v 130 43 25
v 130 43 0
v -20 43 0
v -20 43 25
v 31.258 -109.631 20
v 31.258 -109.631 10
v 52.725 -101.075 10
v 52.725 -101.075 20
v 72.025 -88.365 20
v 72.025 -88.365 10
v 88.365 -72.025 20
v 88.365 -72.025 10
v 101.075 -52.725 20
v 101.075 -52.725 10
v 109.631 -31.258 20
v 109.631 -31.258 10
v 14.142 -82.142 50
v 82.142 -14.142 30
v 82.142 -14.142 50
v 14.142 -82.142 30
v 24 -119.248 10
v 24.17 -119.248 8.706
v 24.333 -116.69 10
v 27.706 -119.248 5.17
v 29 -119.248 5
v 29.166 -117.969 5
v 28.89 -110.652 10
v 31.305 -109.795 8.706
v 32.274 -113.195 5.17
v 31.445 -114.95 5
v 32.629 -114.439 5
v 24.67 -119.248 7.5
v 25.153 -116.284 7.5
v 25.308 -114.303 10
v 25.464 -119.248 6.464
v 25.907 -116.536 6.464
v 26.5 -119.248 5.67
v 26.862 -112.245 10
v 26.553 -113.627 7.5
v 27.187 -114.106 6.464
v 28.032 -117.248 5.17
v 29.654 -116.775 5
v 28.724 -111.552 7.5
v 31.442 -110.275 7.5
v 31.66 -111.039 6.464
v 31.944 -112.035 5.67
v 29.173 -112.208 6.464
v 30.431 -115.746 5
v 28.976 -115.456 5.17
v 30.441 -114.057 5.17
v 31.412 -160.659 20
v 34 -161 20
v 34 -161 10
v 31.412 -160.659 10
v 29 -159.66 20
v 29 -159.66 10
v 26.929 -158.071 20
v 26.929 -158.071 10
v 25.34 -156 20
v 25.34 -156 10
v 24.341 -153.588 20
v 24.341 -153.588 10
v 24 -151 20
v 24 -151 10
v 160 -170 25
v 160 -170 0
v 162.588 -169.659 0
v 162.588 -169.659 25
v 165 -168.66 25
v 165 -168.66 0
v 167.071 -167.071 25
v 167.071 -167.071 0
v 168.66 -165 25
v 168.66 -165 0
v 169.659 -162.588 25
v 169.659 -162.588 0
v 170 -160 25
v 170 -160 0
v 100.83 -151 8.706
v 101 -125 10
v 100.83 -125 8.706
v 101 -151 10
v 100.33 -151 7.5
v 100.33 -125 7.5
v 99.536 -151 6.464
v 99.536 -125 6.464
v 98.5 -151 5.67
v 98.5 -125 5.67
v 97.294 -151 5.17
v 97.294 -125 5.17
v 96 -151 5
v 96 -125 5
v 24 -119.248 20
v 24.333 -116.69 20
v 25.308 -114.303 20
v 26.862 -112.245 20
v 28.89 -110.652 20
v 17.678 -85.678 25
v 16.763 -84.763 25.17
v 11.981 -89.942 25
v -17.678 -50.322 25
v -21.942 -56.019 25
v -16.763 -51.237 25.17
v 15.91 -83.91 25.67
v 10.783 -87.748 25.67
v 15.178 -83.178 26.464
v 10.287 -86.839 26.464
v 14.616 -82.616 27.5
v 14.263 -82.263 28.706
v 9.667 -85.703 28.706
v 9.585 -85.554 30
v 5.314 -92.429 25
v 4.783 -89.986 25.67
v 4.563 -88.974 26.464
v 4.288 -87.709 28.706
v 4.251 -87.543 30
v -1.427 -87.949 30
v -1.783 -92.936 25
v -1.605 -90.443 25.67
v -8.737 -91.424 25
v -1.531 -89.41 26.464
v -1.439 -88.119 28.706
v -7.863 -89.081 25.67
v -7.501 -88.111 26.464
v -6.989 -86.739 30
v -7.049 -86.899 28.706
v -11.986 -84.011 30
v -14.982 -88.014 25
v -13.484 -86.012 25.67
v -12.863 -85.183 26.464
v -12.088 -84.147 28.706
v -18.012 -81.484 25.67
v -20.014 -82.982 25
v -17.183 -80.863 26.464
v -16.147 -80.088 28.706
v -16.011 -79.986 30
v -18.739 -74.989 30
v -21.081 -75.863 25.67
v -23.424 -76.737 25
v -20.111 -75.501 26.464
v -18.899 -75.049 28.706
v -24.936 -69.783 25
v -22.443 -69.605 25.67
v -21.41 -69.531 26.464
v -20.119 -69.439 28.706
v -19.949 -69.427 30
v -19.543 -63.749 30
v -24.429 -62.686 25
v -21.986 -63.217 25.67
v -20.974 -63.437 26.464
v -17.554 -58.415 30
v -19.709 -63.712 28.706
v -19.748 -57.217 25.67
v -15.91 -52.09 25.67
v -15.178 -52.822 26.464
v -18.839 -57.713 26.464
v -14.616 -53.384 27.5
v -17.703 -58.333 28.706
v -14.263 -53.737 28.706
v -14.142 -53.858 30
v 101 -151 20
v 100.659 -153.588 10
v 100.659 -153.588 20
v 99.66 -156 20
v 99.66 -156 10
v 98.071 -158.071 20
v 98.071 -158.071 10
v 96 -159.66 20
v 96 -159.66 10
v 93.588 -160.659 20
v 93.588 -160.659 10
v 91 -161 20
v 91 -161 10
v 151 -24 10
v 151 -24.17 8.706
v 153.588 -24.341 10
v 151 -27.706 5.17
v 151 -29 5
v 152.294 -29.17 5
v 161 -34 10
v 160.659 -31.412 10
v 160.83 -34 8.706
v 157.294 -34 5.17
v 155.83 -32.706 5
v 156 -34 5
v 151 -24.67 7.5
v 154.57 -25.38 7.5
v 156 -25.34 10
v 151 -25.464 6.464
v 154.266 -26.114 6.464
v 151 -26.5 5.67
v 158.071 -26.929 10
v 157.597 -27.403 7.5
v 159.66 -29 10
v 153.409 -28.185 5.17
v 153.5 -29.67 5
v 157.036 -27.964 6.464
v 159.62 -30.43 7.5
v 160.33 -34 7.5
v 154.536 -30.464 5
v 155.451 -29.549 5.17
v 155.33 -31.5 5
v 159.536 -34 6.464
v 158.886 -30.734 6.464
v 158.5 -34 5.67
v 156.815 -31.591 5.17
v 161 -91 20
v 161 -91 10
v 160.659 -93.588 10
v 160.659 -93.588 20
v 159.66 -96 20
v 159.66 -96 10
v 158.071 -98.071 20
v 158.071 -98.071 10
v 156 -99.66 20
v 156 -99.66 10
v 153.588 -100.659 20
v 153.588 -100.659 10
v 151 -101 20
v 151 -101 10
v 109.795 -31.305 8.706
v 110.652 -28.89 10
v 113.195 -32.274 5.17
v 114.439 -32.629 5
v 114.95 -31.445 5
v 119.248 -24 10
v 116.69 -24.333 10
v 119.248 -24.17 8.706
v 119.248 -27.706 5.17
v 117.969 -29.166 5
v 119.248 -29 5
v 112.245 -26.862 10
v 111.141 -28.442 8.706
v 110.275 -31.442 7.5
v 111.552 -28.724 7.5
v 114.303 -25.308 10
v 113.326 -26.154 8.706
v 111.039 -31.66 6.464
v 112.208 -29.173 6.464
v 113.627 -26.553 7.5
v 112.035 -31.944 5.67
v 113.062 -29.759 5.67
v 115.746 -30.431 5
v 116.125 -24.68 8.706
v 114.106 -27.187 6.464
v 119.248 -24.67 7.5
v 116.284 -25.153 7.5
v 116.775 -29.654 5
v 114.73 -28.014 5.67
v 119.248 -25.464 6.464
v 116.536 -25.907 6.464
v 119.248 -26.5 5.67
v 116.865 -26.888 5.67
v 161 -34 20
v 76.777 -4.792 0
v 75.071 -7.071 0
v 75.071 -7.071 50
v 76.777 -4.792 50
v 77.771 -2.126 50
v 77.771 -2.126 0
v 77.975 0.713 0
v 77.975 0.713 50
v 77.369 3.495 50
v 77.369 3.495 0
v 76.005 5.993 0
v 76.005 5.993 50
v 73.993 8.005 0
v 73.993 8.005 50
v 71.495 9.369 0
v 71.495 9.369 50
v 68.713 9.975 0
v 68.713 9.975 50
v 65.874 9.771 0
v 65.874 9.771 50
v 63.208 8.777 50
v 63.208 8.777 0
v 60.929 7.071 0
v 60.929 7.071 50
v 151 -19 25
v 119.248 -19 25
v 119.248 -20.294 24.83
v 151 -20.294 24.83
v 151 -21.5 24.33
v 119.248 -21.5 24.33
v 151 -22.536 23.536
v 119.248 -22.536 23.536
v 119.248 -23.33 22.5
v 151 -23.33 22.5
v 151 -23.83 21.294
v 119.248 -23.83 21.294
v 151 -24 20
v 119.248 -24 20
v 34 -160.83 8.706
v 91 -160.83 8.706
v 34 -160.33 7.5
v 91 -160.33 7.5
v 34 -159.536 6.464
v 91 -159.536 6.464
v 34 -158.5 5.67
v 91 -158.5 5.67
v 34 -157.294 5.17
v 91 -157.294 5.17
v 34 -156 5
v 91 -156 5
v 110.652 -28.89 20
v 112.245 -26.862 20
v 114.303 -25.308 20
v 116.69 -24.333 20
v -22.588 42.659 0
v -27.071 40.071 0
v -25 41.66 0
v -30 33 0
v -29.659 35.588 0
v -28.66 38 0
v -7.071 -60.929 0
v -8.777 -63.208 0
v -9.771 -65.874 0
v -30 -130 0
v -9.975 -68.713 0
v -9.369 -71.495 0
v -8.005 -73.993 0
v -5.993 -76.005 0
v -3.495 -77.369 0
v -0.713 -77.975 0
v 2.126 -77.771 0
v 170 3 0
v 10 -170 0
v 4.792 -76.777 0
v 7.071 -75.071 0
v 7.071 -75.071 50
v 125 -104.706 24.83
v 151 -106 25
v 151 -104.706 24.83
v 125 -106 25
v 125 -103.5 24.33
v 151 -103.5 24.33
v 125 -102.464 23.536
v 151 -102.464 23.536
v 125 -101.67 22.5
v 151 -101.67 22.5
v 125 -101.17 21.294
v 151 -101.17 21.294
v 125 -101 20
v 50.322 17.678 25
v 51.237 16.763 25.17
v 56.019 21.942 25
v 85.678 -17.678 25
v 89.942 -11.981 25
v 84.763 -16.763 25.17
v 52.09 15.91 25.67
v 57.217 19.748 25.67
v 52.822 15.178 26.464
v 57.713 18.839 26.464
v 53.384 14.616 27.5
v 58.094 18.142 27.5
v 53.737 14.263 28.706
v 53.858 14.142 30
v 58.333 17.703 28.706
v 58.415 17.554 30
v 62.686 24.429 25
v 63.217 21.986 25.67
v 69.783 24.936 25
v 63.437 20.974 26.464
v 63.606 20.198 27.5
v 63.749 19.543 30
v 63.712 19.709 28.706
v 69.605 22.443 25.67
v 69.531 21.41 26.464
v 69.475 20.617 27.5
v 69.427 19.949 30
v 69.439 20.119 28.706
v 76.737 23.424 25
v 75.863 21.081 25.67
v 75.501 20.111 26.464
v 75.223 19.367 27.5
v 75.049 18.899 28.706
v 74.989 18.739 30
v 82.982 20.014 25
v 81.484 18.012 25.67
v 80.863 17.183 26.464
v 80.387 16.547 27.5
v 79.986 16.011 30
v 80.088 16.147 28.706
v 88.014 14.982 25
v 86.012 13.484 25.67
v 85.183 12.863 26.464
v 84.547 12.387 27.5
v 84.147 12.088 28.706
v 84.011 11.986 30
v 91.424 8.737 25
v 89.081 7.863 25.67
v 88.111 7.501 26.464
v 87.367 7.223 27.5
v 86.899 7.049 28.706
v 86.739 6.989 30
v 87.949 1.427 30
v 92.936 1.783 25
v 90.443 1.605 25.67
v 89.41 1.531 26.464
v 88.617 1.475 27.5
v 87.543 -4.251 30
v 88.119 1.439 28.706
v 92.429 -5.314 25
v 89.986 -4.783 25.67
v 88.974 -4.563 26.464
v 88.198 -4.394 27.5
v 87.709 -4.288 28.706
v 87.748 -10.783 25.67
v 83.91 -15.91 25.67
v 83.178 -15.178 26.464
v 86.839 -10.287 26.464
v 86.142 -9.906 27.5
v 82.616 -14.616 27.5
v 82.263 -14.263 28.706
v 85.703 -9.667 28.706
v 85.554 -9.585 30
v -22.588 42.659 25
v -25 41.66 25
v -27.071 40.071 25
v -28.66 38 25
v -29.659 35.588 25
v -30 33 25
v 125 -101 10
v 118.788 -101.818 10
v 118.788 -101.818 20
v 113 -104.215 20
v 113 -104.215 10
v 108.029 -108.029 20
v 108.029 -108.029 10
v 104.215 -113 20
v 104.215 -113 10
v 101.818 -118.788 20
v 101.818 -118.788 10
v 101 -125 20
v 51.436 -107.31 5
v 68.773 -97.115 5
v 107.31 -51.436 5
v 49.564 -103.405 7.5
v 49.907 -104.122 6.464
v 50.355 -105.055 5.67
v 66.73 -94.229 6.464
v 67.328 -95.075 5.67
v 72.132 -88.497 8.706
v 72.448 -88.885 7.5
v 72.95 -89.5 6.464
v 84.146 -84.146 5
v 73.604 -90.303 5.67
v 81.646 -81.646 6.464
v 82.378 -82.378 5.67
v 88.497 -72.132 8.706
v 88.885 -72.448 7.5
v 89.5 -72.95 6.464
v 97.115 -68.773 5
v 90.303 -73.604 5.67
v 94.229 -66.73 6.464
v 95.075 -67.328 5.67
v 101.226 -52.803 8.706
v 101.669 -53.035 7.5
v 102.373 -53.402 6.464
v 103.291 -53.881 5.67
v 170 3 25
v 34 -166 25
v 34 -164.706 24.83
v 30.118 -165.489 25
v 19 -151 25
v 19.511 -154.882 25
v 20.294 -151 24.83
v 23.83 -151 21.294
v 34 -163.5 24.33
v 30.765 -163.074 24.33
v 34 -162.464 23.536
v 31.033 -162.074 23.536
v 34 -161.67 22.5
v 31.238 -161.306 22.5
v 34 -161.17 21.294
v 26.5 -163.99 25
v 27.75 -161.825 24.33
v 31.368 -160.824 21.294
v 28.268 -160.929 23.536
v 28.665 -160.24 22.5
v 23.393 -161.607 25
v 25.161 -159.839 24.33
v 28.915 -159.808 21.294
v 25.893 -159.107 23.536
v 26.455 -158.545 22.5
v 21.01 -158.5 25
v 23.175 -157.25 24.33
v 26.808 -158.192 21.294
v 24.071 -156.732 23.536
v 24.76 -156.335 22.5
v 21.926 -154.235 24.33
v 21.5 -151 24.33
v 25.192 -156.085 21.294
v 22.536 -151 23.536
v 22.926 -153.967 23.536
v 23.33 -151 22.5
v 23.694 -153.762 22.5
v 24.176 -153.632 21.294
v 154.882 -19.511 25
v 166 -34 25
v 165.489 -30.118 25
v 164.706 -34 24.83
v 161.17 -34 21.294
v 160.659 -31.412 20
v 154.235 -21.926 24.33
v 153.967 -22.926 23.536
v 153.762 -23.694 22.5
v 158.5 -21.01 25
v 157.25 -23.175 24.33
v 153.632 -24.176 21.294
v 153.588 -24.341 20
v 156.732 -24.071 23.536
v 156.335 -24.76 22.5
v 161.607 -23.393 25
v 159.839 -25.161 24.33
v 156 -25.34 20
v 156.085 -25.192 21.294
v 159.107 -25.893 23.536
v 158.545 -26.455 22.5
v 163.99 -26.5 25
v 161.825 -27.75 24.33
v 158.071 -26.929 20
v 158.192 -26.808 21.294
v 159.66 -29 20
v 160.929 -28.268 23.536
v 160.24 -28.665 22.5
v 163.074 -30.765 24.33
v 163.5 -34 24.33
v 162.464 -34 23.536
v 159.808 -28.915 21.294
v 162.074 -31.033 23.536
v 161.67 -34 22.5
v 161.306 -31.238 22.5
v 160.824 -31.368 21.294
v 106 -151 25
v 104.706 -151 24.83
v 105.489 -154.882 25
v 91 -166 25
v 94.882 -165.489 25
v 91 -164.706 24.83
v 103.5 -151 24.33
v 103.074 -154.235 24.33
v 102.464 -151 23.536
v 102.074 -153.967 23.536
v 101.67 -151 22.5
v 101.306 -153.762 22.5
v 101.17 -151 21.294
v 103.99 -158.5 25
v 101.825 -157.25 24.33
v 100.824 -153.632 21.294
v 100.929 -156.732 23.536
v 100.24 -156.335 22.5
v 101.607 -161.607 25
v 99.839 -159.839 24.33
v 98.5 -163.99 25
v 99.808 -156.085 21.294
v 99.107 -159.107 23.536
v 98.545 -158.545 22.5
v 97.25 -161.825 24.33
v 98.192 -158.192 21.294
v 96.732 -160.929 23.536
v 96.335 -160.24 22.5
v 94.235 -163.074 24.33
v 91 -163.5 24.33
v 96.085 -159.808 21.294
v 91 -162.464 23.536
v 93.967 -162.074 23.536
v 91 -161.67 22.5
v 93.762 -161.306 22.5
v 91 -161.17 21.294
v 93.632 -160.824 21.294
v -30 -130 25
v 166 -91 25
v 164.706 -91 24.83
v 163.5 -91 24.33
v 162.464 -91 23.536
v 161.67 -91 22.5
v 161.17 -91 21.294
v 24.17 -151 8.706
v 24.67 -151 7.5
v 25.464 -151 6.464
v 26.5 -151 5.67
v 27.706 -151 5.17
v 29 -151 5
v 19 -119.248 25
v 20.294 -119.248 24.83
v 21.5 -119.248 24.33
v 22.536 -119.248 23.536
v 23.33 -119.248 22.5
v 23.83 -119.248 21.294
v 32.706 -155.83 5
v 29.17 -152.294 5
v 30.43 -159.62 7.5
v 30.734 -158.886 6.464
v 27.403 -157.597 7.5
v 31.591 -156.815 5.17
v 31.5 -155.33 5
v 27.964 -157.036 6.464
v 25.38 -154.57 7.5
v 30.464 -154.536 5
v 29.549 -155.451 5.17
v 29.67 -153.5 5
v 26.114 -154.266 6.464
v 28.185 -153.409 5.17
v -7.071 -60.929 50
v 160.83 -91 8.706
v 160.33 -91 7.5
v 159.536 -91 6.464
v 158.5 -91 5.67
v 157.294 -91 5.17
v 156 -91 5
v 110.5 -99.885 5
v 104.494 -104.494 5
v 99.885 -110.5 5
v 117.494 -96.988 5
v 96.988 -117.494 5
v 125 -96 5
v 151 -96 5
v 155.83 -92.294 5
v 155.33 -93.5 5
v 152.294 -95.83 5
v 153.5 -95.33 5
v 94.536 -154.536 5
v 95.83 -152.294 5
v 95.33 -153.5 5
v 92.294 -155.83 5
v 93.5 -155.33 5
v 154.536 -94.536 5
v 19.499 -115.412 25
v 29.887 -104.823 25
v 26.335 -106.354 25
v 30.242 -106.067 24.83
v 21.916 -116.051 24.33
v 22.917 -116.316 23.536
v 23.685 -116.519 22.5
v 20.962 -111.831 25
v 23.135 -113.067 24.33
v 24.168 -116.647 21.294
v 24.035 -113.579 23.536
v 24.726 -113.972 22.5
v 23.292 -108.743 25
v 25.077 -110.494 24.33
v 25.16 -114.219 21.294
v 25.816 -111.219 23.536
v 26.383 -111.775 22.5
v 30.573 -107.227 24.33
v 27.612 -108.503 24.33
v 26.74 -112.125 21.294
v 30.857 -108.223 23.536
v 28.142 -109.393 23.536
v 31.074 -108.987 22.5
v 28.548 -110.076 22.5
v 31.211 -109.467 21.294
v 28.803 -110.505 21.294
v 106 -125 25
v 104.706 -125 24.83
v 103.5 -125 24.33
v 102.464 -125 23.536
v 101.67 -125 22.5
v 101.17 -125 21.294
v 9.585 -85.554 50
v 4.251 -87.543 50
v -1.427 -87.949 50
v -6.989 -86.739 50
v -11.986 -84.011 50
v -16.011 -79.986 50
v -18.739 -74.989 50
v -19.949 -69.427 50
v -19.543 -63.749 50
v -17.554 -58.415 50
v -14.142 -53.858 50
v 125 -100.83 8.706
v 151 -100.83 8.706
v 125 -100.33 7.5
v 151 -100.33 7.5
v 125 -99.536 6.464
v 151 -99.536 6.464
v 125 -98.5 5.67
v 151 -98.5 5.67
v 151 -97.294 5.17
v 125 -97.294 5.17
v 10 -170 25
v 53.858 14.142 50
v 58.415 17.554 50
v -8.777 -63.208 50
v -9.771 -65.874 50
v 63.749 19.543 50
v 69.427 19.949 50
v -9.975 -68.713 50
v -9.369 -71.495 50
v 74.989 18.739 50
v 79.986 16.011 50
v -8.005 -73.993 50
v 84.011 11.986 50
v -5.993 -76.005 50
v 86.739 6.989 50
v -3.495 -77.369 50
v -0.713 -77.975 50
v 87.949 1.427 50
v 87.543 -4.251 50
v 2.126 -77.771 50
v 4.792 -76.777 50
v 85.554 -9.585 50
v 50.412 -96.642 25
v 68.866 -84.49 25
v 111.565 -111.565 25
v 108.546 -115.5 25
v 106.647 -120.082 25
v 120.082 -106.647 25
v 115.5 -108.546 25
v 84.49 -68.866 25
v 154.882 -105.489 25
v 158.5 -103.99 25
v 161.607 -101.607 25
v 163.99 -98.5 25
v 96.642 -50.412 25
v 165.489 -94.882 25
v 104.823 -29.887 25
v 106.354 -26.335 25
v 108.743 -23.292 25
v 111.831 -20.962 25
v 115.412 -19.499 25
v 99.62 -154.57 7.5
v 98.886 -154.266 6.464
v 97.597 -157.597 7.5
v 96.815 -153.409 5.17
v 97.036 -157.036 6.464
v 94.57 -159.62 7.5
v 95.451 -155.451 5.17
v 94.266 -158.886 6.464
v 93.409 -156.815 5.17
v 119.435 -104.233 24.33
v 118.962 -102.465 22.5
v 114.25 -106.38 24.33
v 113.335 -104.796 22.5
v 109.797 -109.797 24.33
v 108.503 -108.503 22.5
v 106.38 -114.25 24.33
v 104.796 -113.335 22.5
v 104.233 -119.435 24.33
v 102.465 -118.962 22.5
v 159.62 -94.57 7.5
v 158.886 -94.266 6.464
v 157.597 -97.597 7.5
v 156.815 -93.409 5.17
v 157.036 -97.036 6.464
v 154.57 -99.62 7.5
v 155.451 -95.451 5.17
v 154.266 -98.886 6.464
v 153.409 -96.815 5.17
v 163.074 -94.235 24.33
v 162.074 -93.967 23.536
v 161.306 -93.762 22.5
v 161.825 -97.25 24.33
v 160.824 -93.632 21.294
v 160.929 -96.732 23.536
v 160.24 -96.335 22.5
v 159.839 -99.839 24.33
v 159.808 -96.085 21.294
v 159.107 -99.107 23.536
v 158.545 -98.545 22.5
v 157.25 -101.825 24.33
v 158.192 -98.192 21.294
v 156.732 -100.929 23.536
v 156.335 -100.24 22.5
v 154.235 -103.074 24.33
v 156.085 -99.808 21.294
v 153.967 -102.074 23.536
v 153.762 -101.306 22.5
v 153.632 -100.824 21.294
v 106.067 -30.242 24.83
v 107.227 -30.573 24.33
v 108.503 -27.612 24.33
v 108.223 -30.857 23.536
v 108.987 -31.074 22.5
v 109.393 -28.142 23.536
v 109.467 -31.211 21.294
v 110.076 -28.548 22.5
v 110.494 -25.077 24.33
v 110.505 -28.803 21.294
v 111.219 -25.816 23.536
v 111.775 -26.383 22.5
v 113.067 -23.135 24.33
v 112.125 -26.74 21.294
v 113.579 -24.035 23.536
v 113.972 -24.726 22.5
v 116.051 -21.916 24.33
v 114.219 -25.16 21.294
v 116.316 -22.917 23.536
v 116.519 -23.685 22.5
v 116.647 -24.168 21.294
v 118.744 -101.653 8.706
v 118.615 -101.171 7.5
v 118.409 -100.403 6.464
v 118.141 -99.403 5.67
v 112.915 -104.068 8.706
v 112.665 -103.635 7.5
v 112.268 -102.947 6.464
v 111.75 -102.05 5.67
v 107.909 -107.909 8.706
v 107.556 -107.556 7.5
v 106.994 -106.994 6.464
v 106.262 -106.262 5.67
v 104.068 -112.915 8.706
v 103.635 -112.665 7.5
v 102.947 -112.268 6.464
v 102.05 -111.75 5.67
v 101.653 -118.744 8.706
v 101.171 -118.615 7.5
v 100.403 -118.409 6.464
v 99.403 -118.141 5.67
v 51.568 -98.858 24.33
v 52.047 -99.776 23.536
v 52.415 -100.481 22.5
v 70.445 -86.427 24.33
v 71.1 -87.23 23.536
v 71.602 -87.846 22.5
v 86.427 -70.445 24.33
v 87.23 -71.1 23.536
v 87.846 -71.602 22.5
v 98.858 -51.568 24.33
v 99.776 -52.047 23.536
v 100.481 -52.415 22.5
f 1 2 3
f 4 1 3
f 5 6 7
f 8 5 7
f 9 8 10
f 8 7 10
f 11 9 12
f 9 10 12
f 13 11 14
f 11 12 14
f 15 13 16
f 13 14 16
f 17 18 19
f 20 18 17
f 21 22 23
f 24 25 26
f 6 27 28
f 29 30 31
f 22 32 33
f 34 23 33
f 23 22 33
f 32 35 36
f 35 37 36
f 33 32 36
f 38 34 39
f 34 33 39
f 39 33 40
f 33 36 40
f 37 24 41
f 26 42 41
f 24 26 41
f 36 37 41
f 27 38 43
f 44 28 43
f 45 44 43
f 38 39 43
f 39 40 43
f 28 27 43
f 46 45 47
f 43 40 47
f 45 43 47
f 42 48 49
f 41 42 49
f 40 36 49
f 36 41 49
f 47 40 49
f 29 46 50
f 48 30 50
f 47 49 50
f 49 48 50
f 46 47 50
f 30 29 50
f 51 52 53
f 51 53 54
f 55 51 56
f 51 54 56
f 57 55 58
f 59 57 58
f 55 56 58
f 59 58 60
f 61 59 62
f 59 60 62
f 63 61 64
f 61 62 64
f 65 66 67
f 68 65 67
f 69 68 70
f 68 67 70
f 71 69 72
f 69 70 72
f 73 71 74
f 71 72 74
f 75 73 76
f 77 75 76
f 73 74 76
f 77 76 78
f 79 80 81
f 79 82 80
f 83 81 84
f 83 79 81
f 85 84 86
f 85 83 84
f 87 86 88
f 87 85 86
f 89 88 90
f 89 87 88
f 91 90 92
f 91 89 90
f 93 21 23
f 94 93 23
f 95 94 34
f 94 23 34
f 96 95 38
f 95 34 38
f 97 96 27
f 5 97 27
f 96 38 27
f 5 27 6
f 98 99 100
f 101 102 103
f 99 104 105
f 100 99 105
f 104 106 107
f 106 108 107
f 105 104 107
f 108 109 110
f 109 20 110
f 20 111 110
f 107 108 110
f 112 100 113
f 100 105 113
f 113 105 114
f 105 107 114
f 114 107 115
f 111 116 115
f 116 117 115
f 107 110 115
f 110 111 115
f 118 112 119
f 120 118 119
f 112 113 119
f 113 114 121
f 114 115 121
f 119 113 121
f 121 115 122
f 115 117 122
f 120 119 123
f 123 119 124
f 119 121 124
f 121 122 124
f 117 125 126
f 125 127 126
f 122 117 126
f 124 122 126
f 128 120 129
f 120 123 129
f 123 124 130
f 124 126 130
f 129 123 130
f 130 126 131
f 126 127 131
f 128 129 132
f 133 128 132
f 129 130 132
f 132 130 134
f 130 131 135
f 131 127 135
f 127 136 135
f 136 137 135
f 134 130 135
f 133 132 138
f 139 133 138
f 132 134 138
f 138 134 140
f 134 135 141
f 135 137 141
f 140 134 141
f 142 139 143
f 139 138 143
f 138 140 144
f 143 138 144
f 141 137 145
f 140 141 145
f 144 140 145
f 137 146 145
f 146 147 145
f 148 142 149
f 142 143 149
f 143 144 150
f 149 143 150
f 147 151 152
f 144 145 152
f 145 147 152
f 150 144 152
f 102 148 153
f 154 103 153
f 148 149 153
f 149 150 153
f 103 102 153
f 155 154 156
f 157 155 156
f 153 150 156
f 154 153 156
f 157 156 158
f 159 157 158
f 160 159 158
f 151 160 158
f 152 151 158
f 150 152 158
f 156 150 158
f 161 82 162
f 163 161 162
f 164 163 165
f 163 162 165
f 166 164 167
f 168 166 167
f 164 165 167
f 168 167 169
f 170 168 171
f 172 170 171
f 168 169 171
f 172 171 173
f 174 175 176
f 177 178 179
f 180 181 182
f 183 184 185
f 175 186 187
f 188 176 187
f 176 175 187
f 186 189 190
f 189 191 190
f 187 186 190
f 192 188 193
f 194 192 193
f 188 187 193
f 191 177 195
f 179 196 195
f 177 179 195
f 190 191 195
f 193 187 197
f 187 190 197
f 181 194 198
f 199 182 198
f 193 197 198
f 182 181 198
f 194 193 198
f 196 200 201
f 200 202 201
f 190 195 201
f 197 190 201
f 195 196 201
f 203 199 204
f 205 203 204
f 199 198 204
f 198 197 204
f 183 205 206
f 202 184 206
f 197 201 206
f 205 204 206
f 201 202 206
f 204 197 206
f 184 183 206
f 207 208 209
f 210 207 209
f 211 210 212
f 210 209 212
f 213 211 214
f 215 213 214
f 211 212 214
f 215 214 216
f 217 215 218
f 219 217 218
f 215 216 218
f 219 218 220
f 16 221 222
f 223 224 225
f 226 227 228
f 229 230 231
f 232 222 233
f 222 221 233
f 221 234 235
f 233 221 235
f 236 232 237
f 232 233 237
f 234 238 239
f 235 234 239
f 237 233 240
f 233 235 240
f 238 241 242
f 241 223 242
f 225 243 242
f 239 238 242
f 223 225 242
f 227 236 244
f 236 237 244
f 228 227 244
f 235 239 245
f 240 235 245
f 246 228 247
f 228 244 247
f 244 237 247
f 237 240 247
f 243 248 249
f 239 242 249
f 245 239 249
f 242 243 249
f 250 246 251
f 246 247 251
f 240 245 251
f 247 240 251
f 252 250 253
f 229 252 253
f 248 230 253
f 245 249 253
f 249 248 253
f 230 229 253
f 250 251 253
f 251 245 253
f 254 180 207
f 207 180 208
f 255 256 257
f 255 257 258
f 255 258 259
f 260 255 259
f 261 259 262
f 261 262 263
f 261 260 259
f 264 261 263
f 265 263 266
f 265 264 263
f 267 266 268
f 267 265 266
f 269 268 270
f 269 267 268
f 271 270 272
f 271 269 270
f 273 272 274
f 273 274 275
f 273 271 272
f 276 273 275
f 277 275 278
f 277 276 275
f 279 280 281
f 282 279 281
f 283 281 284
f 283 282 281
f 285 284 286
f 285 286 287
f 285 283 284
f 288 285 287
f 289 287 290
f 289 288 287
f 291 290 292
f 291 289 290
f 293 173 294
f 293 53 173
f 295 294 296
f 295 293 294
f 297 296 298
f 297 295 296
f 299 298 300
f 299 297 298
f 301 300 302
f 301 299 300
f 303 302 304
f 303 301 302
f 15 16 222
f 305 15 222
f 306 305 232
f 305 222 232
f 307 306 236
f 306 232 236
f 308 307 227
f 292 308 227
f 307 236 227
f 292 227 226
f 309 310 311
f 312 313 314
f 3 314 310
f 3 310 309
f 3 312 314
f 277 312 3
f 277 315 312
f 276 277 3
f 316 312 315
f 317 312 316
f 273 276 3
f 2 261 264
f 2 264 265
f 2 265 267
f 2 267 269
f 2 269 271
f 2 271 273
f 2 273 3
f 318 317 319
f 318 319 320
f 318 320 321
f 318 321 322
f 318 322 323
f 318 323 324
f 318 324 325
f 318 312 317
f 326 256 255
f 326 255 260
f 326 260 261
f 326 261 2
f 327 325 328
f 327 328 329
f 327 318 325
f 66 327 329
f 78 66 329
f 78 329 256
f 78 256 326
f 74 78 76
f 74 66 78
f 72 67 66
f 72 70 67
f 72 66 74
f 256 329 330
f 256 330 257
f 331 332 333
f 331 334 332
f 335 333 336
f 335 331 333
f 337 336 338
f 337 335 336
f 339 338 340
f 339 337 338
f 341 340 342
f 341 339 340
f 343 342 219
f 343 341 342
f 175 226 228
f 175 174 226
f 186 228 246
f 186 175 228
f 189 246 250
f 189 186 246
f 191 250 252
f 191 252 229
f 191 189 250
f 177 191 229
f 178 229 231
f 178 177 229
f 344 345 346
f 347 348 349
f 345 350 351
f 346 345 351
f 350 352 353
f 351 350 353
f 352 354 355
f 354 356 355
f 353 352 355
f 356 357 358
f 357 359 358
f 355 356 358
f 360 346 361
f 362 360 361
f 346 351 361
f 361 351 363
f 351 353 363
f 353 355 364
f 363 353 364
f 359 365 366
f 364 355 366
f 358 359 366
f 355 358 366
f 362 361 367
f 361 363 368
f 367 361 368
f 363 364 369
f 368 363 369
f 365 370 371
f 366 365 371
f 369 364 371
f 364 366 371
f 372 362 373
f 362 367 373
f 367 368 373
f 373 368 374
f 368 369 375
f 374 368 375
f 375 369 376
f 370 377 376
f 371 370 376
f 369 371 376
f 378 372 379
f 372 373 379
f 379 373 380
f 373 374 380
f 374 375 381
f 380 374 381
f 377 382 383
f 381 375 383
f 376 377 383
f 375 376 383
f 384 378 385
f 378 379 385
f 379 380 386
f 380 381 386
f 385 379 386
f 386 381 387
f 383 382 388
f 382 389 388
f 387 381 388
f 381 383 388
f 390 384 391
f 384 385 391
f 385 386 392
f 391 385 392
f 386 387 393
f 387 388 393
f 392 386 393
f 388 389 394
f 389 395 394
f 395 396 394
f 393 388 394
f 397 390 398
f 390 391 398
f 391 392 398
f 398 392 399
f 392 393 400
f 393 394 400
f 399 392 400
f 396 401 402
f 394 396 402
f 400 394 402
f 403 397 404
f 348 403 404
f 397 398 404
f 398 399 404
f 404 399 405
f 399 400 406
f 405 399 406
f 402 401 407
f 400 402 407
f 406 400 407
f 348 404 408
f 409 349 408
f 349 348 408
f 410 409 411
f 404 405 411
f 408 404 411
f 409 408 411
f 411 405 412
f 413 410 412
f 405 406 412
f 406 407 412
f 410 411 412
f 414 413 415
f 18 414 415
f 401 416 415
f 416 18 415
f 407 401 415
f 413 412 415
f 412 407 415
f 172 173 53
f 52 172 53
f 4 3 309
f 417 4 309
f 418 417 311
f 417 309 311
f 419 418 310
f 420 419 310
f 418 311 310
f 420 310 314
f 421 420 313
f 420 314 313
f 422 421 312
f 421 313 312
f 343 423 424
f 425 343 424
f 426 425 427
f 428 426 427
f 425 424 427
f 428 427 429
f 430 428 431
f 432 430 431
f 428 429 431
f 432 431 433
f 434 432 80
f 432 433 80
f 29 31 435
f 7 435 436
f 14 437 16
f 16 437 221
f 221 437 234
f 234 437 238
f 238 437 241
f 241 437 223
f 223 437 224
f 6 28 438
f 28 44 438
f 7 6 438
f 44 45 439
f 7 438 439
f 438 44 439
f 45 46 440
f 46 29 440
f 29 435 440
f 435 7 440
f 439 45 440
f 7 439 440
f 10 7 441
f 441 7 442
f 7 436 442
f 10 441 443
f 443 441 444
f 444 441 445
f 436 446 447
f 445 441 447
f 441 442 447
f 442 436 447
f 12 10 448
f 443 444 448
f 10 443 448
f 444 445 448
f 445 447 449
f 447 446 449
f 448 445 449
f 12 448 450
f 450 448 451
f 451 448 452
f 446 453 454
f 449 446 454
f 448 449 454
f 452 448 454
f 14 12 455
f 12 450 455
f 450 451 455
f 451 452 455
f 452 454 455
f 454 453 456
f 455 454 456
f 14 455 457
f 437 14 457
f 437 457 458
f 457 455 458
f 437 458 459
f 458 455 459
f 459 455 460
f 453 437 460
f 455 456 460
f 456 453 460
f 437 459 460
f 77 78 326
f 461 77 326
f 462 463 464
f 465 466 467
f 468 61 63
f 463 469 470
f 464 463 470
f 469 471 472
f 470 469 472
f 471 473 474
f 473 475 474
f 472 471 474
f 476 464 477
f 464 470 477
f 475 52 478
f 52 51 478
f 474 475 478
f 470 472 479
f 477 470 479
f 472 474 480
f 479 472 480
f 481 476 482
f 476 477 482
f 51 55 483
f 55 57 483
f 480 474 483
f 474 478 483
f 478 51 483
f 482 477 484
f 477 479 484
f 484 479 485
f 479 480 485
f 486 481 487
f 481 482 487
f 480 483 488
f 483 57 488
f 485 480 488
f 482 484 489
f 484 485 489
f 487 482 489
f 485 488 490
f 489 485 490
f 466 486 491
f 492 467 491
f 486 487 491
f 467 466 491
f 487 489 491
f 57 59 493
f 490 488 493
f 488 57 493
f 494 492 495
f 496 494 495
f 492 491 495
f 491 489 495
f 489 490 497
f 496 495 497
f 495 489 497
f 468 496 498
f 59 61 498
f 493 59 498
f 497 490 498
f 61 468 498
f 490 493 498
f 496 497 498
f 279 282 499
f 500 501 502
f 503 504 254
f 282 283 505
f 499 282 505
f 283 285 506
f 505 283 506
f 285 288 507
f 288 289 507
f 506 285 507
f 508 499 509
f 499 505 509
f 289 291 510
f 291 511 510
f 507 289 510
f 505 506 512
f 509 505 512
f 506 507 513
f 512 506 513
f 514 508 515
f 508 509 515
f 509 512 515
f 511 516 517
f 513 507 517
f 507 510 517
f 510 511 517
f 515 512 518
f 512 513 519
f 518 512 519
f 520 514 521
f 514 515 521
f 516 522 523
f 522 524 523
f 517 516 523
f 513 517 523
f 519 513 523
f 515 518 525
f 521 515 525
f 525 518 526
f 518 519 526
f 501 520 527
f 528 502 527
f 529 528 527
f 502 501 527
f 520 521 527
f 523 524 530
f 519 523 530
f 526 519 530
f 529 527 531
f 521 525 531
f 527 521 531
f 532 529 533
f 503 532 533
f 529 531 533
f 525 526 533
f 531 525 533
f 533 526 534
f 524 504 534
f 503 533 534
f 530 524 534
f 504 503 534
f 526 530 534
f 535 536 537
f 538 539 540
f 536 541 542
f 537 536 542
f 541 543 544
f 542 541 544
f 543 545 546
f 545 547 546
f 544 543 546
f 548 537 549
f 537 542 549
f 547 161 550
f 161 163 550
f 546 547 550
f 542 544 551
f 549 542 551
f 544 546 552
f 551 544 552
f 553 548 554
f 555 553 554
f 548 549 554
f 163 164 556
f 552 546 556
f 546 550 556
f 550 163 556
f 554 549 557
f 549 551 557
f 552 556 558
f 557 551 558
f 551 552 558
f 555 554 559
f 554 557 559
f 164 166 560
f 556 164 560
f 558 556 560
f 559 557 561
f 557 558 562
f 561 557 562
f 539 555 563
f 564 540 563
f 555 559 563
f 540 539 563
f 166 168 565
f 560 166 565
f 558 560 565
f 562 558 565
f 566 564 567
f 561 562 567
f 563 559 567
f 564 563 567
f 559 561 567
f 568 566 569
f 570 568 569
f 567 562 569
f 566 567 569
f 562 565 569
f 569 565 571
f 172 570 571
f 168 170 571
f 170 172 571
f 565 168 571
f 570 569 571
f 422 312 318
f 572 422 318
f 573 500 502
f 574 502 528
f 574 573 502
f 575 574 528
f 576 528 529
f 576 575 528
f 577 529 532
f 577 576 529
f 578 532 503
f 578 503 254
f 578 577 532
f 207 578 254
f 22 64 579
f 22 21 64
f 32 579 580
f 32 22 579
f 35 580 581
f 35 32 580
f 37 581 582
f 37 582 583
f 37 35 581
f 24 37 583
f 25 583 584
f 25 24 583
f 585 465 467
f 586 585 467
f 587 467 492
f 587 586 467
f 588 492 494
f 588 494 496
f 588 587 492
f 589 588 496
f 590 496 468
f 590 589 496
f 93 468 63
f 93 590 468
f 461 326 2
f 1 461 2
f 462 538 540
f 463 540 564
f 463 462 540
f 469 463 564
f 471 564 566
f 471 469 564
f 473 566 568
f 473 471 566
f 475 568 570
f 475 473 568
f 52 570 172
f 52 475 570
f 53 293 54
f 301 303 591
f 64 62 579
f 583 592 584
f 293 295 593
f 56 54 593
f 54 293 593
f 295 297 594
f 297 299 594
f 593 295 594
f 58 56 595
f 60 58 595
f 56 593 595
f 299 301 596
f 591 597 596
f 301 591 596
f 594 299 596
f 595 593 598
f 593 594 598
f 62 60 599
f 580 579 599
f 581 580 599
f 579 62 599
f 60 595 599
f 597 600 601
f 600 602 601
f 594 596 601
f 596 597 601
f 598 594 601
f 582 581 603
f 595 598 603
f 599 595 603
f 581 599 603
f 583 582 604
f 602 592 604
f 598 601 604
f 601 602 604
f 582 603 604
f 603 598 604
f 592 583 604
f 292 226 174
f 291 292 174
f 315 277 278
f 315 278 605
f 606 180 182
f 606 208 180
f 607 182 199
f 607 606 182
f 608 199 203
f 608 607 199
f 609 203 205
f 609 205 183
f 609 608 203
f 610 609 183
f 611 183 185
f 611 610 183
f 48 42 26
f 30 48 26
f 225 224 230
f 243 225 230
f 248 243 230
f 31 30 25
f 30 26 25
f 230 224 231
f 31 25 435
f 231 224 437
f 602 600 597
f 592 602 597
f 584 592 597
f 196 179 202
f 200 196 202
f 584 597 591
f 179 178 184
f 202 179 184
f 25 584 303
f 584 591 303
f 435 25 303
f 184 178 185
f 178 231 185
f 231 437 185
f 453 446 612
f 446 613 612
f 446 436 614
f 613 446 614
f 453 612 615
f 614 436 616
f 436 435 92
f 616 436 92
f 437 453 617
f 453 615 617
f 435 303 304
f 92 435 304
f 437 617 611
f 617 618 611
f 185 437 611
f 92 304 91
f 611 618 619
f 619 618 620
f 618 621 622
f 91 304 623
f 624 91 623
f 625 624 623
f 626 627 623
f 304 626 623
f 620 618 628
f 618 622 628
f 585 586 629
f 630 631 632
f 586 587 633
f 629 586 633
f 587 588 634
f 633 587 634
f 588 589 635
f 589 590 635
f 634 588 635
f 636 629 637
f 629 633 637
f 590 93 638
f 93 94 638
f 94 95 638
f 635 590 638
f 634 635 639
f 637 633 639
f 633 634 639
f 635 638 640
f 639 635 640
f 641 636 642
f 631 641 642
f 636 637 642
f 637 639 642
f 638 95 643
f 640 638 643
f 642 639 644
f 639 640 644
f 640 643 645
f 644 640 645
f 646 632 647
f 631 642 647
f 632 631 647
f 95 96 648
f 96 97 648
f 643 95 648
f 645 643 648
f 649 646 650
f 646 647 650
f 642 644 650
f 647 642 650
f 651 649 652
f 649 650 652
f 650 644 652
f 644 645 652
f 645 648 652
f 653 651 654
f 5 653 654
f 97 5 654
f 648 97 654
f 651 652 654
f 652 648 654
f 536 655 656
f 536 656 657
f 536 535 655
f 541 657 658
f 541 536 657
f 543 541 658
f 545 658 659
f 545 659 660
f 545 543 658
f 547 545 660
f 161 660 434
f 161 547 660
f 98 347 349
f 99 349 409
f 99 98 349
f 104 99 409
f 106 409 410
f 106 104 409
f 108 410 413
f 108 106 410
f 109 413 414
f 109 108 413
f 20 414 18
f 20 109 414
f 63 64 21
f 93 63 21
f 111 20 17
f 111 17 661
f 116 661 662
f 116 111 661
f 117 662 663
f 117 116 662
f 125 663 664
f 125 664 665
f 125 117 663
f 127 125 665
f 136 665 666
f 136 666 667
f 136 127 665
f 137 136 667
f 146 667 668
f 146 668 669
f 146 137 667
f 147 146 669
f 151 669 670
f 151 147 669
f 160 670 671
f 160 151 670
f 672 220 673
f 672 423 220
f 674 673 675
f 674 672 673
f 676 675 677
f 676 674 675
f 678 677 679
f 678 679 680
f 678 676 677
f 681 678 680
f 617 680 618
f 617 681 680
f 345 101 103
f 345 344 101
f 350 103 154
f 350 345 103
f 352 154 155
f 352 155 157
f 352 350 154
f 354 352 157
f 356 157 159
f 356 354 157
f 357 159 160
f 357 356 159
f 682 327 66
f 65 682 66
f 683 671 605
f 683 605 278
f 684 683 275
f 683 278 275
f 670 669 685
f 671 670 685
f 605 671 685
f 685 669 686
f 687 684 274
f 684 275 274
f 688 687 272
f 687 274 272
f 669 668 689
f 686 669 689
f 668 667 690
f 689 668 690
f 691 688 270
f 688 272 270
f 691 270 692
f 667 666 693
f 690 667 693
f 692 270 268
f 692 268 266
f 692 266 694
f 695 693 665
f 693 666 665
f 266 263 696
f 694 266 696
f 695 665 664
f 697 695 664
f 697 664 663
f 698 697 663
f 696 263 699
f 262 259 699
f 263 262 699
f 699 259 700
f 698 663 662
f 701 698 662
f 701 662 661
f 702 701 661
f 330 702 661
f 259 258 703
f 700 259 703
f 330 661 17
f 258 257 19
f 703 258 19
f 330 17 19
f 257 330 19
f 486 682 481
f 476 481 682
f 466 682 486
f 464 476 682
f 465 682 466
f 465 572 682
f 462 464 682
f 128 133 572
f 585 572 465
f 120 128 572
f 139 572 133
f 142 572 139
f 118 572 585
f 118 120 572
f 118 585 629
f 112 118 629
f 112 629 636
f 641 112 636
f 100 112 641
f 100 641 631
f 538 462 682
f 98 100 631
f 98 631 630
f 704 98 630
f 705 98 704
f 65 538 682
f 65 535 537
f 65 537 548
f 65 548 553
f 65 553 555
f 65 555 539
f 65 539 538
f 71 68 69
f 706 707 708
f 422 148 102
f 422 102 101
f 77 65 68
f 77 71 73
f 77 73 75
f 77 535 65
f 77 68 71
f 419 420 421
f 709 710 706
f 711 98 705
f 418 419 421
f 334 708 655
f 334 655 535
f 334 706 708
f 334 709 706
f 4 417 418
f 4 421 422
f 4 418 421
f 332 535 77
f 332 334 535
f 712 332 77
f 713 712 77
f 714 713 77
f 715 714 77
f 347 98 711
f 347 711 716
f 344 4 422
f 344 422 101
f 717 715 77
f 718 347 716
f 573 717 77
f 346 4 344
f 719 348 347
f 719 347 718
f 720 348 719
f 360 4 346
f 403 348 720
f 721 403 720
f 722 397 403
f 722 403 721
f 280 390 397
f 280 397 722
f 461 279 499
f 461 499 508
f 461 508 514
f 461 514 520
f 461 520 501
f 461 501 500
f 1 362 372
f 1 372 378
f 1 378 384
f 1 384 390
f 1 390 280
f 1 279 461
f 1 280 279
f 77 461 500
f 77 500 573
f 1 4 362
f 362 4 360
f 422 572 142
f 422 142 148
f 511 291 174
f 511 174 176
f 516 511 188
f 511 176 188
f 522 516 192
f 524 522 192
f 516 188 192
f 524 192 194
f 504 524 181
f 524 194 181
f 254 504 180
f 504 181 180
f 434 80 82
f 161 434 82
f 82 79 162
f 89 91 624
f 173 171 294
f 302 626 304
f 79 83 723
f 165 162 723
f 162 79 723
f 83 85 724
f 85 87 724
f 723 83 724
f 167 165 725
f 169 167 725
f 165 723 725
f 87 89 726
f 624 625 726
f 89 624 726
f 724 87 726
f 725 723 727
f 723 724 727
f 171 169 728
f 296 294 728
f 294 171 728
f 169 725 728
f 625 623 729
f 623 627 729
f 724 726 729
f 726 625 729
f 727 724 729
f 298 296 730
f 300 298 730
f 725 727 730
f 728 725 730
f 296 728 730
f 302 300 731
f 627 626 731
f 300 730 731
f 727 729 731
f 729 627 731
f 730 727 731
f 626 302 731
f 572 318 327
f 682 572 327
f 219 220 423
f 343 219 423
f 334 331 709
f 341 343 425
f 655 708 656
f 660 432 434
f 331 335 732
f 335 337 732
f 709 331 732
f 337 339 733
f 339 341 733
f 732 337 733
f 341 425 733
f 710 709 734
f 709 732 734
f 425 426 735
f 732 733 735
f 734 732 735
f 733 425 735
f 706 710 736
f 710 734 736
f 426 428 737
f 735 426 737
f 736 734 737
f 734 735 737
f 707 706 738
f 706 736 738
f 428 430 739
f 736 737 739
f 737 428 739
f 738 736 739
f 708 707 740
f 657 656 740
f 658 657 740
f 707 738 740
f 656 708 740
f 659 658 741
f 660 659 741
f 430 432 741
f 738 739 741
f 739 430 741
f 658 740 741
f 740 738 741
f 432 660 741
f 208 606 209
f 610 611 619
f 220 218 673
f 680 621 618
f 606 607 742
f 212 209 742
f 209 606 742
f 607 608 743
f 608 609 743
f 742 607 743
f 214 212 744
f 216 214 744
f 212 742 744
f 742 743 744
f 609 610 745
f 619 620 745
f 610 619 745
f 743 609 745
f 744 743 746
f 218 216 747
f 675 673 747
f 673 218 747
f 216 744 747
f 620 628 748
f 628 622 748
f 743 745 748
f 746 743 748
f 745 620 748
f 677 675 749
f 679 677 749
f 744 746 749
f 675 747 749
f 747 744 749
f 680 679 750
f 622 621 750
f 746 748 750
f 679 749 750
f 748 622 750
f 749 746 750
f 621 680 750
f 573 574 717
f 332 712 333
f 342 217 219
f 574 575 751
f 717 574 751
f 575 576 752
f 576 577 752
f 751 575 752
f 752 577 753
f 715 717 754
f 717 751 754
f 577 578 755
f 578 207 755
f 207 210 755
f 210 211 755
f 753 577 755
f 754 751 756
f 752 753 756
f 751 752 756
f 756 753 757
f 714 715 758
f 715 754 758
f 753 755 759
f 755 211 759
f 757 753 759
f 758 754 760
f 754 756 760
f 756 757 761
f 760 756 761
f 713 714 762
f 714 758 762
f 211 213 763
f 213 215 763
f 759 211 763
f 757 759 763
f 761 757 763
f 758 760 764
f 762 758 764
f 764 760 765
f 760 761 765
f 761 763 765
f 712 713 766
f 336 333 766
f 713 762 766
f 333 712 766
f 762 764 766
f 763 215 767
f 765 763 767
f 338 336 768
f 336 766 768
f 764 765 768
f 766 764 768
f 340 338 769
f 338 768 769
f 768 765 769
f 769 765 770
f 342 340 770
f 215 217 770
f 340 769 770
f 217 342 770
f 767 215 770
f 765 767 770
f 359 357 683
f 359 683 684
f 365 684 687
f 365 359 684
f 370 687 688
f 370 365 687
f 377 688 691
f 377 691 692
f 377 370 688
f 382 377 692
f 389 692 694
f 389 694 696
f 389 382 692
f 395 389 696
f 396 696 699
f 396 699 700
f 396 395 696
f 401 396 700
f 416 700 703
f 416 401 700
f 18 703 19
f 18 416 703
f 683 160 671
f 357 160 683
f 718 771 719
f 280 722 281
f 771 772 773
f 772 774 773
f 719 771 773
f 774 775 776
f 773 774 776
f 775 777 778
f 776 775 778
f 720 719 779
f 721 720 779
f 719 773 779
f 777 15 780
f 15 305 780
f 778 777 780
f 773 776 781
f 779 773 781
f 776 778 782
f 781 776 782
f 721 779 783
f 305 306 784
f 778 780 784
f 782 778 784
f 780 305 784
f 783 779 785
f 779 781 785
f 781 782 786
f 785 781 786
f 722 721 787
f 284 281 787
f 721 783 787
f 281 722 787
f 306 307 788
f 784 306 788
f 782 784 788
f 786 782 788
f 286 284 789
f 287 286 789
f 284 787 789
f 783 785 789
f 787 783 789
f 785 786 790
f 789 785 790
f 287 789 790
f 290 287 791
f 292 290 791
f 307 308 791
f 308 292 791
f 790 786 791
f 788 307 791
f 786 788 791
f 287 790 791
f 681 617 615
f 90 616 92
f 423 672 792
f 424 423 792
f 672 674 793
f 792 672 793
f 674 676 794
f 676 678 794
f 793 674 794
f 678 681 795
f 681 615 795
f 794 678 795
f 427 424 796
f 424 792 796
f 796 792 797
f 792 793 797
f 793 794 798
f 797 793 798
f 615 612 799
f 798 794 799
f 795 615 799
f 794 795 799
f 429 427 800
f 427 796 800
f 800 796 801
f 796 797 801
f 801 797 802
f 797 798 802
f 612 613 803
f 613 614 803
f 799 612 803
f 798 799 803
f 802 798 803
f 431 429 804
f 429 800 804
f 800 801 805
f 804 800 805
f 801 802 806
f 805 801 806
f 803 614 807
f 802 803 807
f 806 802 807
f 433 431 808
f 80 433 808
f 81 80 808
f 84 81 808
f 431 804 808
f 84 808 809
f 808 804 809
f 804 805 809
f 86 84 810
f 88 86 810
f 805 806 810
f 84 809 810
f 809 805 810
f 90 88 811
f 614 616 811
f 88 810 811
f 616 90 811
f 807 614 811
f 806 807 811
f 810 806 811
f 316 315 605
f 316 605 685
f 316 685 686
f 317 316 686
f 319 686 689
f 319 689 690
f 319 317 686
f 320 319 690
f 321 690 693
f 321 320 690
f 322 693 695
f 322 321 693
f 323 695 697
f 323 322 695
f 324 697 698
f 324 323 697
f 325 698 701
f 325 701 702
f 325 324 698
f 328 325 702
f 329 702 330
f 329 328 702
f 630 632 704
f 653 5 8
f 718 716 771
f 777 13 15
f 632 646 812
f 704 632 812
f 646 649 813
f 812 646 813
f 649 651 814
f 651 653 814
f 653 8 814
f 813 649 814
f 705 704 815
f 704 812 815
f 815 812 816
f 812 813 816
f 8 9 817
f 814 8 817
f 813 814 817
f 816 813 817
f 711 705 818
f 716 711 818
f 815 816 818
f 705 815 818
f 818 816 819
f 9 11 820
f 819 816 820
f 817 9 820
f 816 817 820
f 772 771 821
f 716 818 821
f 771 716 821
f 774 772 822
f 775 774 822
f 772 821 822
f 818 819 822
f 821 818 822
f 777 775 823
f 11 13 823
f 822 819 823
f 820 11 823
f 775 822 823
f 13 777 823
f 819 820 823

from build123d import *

# Parameters (mm, degrees)
F1_DEPTH = 25
F3_DEPTH = 5
F4_DEPTH = 50
F5_R     = 5


with BuildPart() as f1:
    # F0 (on Top) → F1 (new body)
    with BuildSketch(Plane.XY):
        with BuildLine():
            Line((170, -160), (170, 3))
            Line((170, 3), (130, 43))
            Line((130, 43), (-20, 43))
            ThreePointArc((-20, 43), (-27.0710678119, 40.0710678119), (-30, 33))
            Line((-30, 33), (-30, -130))
            Line((-30, -130), (10, -170))
            Line((10, -170), (160, -170))
            ThreePointArc((160, -170), (167.0710678119, -167.0710678119), (170, -160))
        make_face()
        with BuildLine():
            ThreePointArc((24, -119.2476414861), (26.018165786, -113.2234965193), (31.2580645161, -109.630896205))
            ThreePointArc((31.2580645161, -109.630896205), (80.6101730553, -80.6101730553), (109.630896205, -31.2580645161))
            ThreePointArc((109.630896205, -31.2580645161), (113.2234965193, -26.018165786), (119.2476414861, -24))
            Line((119.2476414861, -24), (151, -24))
            ThreePointArc((151, -24), (158.0710678119, -26.9289321881), (161, -34))
            Line((161, -34), (161, -91))
            ThreePointArc((161, -91), (158.0710678119, -98.0710678119), (151, -101))
            Line((151, -101), (125, -101))
            ThreePointArc((125, -101), (108.0294372515, -108.0294372515), (101, -125))
            Line((101, -125), (101, -151))
            ThreePointArc((101, -151), (98.0710678119, -158.0710678119), (91, -161))
            Line((91, -161), (34, -161))
            ThreePointArc((34, -161), (26.9289321881, -158.0710678119), (24, -151))
            Line((24, -151), (24, -119.2476414861))
        make_face(mode=Mode.SUBTRACT)
        with BuildLine():
            ThreePointArc((53.8578643763, 14.1421356237), (82.1421356237, 14.1421356237), (82.1421356237, -14.1421356237))
            Line((82.1421356237, -14.1421356237), (14.1421356237, -82.1421356237))
            ThreePointArc((14.1421356237, -82.1421356237), (-14.1421356237, -82.1421356237), (-14.1421356237, -53.8578643763))
            Line((-14.1421356237, -53.8578643763), (53.8578643763, 14.1421356237))
        make_face(mode=Mode.SUBTRACT)
    extrude(amount=F1_DEPTH)

    # F2 (on face) → F3 (join)
    with BuildSketch(Plane(origin=(0, 0, 0), x_dir=(1, 0, 0), z_dir=(0, 0, -1))):
        with BuildLine():
            ThreePointArc((34, 161), (26.9289321881, 158.0710678119), (24, 151))
            Line((24, 151), (24, 119.2476414861))
            ThreePointArc((24, 119.2476414861), (26.018165786, 113.2234965193), (31.2580645161, 109.630896205))
            ThreePointArc((31.2580645161, 109.630896205), (80.6101730553, 80.6101730553), (109.630896205, 31.2580645161))
            ThreePointArc((109.630896205, 31.2580645161), (113.2234965193, 26.018165786), (119.2476414861, 24))
            Line((119.2476414861, 24), (151, 24))
            ThreePointArc((151, 24), (158.0710678119, 26.9289321881), (161, 34))
            Line((161, 34), (161, 91))
            ThreePointArc((161, 91), (158.0710678119, 98.0710678119), (151, 101))
            Line((151, 101), (125, 101))
            ThreePointArc((125, 101), (108.0294372515, 108.0294372515), (101, 125))
            Line((101, 125), (101, 151))
            ThreePointArc((101, 151), (98.0710678119, 158.0710678119), (91, 161))
            Line((91, 161), (34, 161))
        make_face()
    extrude(amount=-F3_DEPTH)

    # F2 (on face) → F4 (join)
    with BuildSketch(Plane(origin=(0, 0, 0), x_dir=(1, 0, 0), z_dir=(0, 0, -1))):
        with BuildLine():
            ThreePointArc((14.1421356237, 82.1421356237), (-14.1421356237, 82.1421356237), (-14.1421356237, 53.8578643763))
            Line((-14.1421356237, 53.8578643763), (53.8578643763, -14.1421356237))
            ThreePointArc((53.8578643763, -14.1421356237), (82.1421356237, -14.1421356237), (82.1421356237, 14.1421356237))
            Line((82.1421356237, 14.1421356237), (14.1421356237, 82.1421356237))
        make_face()
        with BuildLine():
            Line((60.9289321881, -7.0710678119), (-7.0710678119, 60.9289321881))
            ThreePointArc((-7.0710678119, 60.9289321881), (-7.0710678119, 75.0710678119), (7.0710678119, 75.0710678119))
            Line((7.0710678119, 75.0710678119), (75.0710678119, 7.0710678119))
            ThreePointArc((75.0710678119, 7.0710678119), (75.0710678119, -7.0710678119), (60.9289321881, -7.0710678119))
        make_face(mode=Mode.SUBTRACT)
    extrude(amount=-F4_DEPTH)

    # F5
    f5_edges = [f1.edges().sort_by_distance(p)[0] for p in [
        (19.857864, -19.857864, 25),
        (26.928932, -158.071068, 5),
        (24, -135.123821, 5),
        (26.018166, -113.223497, 5),
        (80.610173, -80.610173, 5),
        (113.223497, -26.018166, 5),
        (135.123821, -24, 5),
        (158.071068, -26.928932, 5),
        (161, -62.5, 5),
        (158.071068, -98.071068, 5),
        (138, -101, 5),
        (108.029437, -108.029437, 5),
        (101, -138, 5),
        (98.071068, -158.071068, 5),
        (62.5, -161, 5),
        (108.029437, -108.029437, 25),
    ]]
    fillet(f5_edges, radius=F5_R)


solid = f1.part
